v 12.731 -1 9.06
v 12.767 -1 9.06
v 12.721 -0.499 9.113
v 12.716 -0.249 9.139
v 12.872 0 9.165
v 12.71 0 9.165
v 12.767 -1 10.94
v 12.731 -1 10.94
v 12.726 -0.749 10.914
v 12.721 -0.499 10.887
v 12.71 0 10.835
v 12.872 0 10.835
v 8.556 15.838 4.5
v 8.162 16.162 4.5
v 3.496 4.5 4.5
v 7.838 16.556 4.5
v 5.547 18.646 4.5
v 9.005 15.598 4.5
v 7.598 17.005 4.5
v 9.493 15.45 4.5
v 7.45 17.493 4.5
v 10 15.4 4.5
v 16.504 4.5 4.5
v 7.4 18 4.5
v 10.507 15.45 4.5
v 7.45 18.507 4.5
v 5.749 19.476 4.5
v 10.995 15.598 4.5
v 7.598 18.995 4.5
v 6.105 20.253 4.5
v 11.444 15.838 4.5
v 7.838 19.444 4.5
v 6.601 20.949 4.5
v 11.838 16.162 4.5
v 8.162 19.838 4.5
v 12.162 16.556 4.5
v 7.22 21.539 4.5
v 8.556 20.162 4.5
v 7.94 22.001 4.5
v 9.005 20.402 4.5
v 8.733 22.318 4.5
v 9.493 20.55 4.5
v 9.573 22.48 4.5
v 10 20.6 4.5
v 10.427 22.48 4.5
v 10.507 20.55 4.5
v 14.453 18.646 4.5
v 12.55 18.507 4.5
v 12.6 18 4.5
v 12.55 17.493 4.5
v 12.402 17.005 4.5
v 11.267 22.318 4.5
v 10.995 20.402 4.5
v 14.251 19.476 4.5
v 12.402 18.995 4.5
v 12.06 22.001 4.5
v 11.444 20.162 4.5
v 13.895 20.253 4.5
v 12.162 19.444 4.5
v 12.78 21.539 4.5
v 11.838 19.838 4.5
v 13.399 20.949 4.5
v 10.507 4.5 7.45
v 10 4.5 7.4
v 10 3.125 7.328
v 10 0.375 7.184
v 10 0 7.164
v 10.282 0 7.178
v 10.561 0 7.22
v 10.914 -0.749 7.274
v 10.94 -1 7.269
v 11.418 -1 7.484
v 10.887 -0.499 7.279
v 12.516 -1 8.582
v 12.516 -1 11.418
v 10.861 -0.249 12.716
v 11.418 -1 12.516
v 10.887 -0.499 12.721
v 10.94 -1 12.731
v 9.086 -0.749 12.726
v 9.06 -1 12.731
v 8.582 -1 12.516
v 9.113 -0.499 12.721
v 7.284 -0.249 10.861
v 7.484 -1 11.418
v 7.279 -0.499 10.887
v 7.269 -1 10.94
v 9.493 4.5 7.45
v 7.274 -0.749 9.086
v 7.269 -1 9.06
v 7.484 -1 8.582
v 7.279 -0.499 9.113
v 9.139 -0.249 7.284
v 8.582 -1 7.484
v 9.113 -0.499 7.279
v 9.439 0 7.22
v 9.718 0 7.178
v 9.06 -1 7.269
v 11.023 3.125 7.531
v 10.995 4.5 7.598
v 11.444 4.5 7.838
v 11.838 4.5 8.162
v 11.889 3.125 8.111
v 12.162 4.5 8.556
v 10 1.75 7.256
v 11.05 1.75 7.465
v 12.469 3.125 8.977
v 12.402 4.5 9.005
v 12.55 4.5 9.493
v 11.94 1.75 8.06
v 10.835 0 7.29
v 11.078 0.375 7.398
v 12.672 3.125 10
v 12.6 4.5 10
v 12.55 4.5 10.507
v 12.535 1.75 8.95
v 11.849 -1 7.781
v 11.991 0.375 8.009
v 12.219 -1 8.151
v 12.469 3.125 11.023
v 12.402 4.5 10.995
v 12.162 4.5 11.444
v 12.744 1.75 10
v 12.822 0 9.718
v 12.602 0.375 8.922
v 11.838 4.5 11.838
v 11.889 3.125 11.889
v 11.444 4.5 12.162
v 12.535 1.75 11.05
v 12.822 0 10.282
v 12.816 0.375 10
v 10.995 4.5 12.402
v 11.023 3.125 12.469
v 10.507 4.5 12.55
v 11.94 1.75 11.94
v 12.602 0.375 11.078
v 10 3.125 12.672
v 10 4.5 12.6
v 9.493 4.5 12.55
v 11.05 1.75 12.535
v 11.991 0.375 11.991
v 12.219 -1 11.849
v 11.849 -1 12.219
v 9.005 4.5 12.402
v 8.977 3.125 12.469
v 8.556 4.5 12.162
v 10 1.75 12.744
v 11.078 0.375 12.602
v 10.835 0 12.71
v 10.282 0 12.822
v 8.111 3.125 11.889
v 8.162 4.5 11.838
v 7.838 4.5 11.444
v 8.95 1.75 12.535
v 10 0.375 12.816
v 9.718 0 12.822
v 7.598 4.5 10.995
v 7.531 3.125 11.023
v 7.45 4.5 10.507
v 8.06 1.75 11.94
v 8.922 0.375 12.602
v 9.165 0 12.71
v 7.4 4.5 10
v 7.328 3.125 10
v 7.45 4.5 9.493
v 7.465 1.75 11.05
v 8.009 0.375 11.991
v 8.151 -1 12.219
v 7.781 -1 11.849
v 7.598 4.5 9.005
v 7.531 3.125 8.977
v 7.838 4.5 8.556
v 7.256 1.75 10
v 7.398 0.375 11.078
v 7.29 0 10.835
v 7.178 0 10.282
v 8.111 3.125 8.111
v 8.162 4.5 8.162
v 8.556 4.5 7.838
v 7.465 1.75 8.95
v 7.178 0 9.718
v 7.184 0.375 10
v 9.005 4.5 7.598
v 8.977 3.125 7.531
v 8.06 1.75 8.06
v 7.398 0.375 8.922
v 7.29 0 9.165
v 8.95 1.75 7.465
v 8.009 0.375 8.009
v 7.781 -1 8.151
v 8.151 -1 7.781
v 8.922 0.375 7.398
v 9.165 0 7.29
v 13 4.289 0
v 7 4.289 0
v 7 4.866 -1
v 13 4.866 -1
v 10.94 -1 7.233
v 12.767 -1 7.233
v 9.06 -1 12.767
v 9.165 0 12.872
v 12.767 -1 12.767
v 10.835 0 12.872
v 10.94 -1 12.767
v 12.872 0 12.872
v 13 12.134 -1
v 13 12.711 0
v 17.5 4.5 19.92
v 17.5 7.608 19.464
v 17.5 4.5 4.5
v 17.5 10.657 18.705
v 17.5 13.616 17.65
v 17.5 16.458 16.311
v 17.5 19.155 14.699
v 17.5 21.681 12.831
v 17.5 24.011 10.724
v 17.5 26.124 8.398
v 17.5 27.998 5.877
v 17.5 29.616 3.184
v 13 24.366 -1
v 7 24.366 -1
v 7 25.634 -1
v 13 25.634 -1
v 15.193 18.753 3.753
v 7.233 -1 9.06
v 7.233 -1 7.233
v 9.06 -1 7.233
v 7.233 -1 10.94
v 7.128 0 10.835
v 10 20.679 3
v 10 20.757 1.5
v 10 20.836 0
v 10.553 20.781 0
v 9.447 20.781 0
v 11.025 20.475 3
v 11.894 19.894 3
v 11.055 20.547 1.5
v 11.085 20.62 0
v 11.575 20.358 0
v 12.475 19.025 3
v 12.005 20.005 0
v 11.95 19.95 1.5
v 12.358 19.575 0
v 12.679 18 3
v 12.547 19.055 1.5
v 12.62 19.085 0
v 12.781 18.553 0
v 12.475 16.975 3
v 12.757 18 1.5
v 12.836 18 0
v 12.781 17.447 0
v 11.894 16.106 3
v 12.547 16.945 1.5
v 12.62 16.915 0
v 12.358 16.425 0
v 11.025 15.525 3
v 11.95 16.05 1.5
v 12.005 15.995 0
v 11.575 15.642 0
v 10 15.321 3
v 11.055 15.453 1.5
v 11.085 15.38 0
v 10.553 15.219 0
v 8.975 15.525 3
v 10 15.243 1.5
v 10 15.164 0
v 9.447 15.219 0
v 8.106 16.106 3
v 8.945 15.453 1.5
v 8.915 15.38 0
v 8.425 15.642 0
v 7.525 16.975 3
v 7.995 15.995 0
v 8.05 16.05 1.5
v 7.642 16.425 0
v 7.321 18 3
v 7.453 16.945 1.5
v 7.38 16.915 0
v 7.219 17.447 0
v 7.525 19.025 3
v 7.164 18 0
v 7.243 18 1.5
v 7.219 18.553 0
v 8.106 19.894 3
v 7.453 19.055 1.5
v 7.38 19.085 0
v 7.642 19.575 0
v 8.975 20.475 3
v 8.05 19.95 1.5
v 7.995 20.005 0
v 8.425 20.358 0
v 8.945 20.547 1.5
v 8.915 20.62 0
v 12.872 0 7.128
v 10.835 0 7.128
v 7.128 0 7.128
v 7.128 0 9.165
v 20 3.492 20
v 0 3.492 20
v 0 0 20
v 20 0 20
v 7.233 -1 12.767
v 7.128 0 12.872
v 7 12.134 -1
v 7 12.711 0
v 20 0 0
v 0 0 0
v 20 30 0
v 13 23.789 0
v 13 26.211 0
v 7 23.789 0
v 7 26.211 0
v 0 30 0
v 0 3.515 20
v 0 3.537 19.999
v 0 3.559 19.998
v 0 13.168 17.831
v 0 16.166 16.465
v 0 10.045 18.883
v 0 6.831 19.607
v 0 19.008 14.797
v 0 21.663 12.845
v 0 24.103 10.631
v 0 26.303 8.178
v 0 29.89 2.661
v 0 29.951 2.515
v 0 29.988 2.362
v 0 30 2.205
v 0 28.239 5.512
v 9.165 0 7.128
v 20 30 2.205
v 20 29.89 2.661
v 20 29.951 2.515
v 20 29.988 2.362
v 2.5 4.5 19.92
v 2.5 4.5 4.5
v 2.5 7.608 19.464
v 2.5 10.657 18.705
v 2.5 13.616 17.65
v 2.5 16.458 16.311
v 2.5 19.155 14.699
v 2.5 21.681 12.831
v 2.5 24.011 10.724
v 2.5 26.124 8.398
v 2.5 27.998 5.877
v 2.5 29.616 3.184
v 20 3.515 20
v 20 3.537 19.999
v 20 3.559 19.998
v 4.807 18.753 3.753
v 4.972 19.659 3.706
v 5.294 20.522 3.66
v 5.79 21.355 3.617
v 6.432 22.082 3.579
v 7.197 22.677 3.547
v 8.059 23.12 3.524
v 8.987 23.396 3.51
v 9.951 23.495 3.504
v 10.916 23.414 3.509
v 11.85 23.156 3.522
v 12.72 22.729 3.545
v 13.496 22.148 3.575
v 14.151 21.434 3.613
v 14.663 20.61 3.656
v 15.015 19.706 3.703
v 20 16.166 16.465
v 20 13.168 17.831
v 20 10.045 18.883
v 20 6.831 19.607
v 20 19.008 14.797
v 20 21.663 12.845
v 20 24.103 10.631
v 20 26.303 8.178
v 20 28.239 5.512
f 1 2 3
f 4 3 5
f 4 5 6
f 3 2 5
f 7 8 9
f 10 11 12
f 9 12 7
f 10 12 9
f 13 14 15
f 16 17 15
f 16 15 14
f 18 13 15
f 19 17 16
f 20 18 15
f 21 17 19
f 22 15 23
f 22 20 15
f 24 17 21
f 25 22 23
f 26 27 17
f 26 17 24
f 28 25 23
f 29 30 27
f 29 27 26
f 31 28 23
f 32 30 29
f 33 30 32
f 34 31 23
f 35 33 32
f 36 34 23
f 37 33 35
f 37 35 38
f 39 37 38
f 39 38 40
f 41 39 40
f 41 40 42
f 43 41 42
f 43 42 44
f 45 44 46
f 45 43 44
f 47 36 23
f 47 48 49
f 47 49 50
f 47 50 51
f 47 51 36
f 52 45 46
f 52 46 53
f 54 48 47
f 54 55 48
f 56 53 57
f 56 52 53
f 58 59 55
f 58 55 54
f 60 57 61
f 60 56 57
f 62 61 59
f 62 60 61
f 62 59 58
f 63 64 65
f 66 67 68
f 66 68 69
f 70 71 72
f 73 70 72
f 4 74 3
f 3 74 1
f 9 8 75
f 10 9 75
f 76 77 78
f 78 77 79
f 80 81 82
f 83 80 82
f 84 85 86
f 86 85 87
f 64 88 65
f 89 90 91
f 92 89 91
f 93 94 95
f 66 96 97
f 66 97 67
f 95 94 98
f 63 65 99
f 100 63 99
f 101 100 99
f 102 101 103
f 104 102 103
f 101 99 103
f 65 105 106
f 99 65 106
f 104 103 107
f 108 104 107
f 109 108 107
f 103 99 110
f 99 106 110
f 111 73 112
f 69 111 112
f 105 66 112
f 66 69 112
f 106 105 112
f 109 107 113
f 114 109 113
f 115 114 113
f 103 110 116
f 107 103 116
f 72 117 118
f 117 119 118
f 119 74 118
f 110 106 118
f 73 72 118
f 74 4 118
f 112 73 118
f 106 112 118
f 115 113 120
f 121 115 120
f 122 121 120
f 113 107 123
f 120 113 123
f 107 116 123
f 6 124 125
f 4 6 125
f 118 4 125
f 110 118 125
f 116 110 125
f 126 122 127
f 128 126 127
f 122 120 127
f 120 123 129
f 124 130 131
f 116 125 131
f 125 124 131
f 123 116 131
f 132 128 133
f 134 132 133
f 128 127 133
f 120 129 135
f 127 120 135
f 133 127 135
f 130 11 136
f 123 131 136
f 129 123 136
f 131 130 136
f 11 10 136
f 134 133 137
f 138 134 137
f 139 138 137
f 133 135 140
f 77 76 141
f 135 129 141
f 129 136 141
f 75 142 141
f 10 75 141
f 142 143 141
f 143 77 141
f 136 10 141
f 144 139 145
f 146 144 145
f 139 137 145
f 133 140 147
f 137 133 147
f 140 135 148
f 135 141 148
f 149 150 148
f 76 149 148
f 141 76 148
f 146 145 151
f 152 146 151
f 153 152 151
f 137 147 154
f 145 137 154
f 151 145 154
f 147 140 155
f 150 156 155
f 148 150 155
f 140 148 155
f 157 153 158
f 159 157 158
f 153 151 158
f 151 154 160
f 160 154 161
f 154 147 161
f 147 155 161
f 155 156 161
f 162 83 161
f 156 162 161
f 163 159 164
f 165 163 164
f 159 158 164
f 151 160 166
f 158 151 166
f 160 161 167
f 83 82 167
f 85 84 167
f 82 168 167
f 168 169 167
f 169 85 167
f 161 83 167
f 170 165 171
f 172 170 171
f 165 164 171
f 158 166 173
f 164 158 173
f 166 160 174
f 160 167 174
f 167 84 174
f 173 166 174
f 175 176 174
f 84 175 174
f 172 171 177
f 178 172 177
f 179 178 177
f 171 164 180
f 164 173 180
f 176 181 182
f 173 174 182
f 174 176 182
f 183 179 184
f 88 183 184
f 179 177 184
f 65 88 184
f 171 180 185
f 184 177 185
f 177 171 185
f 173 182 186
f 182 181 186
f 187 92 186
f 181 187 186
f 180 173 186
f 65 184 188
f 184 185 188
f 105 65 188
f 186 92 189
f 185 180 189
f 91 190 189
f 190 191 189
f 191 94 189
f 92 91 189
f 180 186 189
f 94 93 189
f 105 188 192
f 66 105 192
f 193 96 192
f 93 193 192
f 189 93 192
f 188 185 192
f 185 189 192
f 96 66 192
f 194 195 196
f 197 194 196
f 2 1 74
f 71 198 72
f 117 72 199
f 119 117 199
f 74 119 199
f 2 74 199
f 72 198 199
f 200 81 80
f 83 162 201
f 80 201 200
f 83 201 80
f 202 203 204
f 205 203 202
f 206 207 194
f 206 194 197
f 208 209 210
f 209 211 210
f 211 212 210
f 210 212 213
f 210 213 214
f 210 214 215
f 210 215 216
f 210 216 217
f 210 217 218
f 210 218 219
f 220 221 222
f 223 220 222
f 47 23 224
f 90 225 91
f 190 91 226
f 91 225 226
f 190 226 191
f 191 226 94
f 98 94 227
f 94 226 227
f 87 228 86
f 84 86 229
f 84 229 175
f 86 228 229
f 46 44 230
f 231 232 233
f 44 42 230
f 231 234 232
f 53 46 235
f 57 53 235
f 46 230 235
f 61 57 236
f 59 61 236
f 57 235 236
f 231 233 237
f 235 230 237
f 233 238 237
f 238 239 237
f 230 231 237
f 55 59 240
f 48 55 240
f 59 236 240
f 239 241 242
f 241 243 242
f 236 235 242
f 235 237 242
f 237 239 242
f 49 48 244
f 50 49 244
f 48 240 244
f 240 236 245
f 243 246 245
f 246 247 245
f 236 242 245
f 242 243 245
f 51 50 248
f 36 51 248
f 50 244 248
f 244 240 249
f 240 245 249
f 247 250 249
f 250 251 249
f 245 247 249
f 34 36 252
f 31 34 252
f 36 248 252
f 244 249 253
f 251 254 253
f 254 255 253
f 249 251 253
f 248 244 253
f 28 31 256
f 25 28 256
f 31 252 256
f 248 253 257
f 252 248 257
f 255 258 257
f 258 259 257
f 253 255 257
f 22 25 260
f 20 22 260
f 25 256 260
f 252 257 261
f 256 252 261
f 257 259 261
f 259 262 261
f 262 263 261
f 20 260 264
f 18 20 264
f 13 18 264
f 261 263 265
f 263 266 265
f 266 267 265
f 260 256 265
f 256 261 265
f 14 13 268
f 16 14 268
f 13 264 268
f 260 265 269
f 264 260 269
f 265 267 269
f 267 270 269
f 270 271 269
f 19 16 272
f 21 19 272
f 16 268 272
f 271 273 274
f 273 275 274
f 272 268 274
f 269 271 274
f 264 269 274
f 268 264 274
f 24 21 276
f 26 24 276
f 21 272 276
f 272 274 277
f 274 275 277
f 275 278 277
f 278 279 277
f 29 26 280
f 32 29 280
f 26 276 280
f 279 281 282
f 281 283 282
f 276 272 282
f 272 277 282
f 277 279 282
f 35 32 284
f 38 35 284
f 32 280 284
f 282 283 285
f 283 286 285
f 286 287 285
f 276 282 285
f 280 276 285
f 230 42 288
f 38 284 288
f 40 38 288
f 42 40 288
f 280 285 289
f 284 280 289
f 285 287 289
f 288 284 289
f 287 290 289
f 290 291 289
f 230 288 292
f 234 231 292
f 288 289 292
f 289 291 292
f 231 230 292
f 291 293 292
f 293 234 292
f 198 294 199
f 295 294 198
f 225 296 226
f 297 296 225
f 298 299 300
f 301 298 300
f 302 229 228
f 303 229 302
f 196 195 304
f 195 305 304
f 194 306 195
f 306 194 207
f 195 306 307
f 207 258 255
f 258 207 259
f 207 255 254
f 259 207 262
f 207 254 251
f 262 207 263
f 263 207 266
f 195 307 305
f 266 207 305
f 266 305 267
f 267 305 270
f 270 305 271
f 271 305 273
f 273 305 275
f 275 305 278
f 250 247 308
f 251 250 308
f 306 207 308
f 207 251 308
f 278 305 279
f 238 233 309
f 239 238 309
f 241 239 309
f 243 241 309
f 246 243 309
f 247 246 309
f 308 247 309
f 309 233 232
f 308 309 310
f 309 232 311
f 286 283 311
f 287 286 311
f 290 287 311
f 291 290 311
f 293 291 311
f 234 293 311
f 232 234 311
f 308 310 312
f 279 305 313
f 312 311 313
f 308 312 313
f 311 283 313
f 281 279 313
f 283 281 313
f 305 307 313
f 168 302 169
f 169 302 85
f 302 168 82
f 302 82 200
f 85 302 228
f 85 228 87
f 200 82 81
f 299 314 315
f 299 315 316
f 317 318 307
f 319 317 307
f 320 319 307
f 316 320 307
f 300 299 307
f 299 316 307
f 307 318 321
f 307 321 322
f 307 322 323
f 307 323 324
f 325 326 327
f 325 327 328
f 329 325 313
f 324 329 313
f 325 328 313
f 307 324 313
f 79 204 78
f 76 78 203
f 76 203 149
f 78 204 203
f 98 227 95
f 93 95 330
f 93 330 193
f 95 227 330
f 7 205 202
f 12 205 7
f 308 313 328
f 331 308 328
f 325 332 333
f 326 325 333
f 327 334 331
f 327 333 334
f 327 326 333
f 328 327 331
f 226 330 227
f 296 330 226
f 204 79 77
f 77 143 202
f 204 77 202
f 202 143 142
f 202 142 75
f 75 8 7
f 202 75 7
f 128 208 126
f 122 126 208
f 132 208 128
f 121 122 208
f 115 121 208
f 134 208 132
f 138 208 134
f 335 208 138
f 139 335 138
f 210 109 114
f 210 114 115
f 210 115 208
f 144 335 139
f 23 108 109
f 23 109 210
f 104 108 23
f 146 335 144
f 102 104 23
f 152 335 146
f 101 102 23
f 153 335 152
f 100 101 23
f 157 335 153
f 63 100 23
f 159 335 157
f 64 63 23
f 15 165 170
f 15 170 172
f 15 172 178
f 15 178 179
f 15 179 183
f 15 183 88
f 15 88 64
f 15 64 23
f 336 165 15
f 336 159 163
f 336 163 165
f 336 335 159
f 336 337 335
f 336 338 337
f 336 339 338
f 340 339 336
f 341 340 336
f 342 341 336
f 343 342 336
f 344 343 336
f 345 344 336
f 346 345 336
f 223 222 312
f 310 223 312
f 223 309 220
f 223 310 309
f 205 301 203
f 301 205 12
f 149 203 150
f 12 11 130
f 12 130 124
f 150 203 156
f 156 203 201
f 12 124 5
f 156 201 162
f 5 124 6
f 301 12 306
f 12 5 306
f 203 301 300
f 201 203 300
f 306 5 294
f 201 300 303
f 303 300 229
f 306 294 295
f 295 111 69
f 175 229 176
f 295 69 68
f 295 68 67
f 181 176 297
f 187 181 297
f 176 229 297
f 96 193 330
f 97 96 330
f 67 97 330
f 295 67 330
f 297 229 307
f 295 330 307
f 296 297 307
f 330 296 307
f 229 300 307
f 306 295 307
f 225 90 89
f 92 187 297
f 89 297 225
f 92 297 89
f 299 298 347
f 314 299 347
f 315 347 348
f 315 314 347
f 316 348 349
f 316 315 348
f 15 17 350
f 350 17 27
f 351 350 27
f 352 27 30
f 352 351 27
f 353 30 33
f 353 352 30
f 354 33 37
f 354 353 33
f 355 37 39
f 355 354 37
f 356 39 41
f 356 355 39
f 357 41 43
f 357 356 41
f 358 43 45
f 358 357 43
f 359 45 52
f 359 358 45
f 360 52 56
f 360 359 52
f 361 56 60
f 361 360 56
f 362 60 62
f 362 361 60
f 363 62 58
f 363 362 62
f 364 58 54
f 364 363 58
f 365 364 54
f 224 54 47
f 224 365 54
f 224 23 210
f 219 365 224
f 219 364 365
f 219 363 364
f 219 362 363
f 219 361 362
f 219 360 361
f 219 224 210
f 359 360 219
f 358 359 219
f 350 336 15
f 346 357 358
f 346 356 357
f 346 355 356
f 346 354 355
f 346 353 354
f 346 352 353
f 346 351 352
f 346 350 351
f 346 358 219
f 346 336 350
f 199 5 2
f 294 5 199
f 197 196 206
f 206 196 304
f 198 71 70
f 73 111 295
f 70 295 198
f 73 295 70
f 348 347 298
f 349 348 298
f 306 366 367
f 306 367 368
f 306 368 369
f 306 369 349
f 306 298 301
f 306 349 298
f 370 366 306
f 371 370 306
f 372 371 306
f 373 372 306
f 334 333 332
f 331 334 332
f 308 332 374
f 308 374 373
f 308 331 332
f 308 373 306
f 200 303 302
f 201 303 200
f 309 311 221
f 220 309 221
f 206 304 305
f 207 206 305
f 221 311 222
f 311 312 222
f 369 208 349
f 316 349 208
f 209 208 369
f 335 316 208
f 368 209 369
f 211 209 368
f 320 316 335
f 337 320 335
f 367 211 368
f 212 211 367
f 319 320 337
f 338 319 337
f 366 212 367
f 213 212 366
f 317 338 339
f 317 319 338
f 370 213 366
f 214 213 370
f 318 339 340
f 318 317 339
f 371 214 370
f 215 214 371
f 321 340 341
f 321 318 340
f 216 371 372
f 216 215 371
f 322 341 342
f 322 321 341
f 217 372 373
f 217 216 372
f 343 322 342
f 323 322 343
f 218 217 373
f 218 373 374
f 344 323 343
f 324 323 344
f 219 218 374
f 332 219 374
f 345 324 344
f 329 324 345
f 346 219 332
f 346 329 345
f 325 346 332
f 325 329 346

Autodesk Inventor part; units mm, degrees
sketch "Sketch_1" plane through (0, 0, 0) normal (1, 0, 0) x (0, 0, -1)
  line L0 (-20, 3.4921) -> (-20, 0)
  line L1 (-20, 0) -> (0, 0)
  line L2 (0, 0) -> (0, 30)
  line L3 (0, 30) -> (-2.2048, 30)
  arc A0 (-2.2048, 30) -> (-2.6607, 29.89) centre (-2.2048, 29) ccw
  arc A1 (-2.6607, 29.89) -> (-19.9977, 3.5593) centre (11.93, 1.41) ccw
  arc A2 (-19.9977, 3.5593) -> (-20, 3.4921) centre (-19, 3.4921) ccw
extrude "Extrusion1" add sketch "Sketch_1" along normal blind 20
sketch "Sketch_2" plane through (10, 0, 0) normal (1, 0, 0) x (0, 0, -1)
  line L0 (-20, 30) -> (-20, 4.5)
  line L1 (-20, 4.5) -> (-4.5, 4.5)
  line L2 (-4.5, 4.5) -> (-3.1636, 30)
  line L3 (-3.1636, 30) -> (-20, 30)
extrude "Extrusion2" cut sketch "Sketch_2" along normal mid plane 15
sketch "Sketch_5" plane through (10, 0, 0) normal (1, 0, 0) x (0, 0, -1)
  line L0 (-0.5, 26.5) -> (-0.5, 23.5)
  line L1 (-0.5, 23.5) -> (1, 24.366)
  line L2 (1, 24.366) -> (1, 25.634)
  line L3 (1, 25.634) -> (-0.5, 26.5)
extrude "Extrusion3" add sketch "Sketch_5" along normal mid plane 6
sketch "Sketch_6" plane through (10, 0, 0) normal (1, 0, 0) x (0, 0, -1)
  line L0 (-0.5, 13) -> (-0.5, 4)
  line L1 (-0.5, 4) -> (1, 4.866)
  line L2 (1, 4.866) -> (1, 12.134)
  line L3 (1, 12.134) -> (-0.5, 13)
extrude "Extrusion4" add sketch "Sketch_6" along normal mid plane 6
sketch "Sketch_3" plane through (0, 0, 4.5) normal (0, 0, 1) x (1, 0, 0)
  line L0 (3.4955, 4.5) -> (16.5045, 4.5)
  line L1 (16.5045, 4.5) -> (14.4534, 18.6457)
  arc A0 (14.4534, 18.6457) -> (5.5466, 18.6457) centre (10, 18) ccw
  line L2 (5.5466, 18.6457) -> (3.4955, 4.5)
extrude "Extrusion5" add sketch "Sketch_3" against normal blind 2 draft 45
sketch "Sketch_7" plane through (0, 0.5, 0) normal (0, 1, 0) x (1, 0, 0)
  line L0 (7.075, -12.925) -> (12.925, -12.925)
  line L1 (12.925, -12.925) -> (12.925, -7.075)
  line L2 (12.925, -7.075) -> (7.075, -7.075)
  line L3 (7.075, -7.075) -> (7.075, -12.925)
extrude "Extrusion6" add sketch "Sketch_7" against normal blind 1.5 draft -6
sketch "Sketch_9" plane through (0, 0, 0) normal (0, 1, 0) x (1, 0, 0)
  line L0 (7.075, -10.835) -> (9.165, -10.835)
  line L1 (9.165, -10.835) -> (9.165, -12.925)
  line L2 (9.165, -12.925) -> (10.835, -12.925)
  line L3 (10.835, -12.925) -> (10.835, -10.835)
  line L4 (10.835, -10.835) -> (12.925, -10.835)
  line L5 (12.925, -10.835) -> (12.925, -9.165)
  line L6 (12.925, -9.165) -> (10.835, -9.165)
  line L7 (10.835, -9.165) -> (10.835, -7.075)
  line L8 (10.835, -7.075) -> (9.165, -7.075)
  line L9 (9.165, -7.075) -> (9.165, -9.165)
  line L10 (9.165, -9.165) -> (7.075, -9.165)
  line L11 (7.075, -9.165) -> (7.075, -10.835)
extrude "Extrusion7" cut sketch "Sketch_9" against normal blind 1 draft 6
sketch "Sketch_4" plane through (10, 0, 0) normal (1, 0, 0) x (0, 0, -1)
  line L0 (0, 18) -> (-4.5, 18)
  line L1 (-4.5, 18) -> (-4.5, 20.6)
  line L2 (-4.5, 20.6) -> (0, 20.8358)
  line L3 (0, 20.8358) -> (0, 18)
  line L4 (0, 18) -> (-4.5, 18)
revolve "Revolution1" cut sketch "Sketch_4" angle 360 about axis through (10, 18, 0) along (0, 0, -1)
sketch "Sketch_8" plane through (10, 0, 0) normal (1, 0, 0) x (0, 0, -1)
  line L0 (-10, -1) -> (-10, 4.5)
  line L1 (-10, 4.5) -> (-7.4, 4.5)
  line L2 (-7.4, 4.5) -> (-7.1118, -1)
  line L3 (-7.1118, -1) -> (-10, -1)
  line L4 (-10, -1) -> (-10, 4.5)
revolve "Revolution2" cut sketch "Sketch_8" angle 360 about axis through (10, -1, 10) along (0, -1, 0)
ref_plane "to_bolt1_XY" through (10, 18, 4.5) normal (0, 0, 1) x (1, 0, 0)
ref_plane "to_bolt1_YZ" through (10, 18, 4.5) normal (1, 0, 0) x (0, 1, 0)
ref_plane "to_bolt1_ZX" through (10, 18, 4.5) normal (0, 1, 0) x (0, 0, 1)
ref_plane "to_bolt2_XY" through (10, 4.5, 10) normal (0, 1, 0) x (1, 0, 0)
ref_plane "to_bolt2_YZ" through (10, 4.5, 10) normal (1, 0, 0) x (0, 0, -1)
ref_plane "to_bolt2_ZX" through (10, 4.5, 10) normal (0, 0, -1) x (0, 1, 0)
ref_plane "to_nut1_XY" through (10, 18, -1) normal (0, 0, -1) x (0, 1, 0)
ref_plane "to_nut1_YZ" through (10, 18, -1) normal (0, 1, 0) x (1, 0, 0)
ref_plane "to_nut1_ZX" through (10, 18, -1) normal (1, 0, 0) x (0, 0, -1)
ref_plane "to_nut2_XY" through (10, -1, 10) normal (0, -1, 0) x (0, 0, -1)
ref_plane "to_nut2_YZ" through (10, -1, 10) normal (0, 0, -1) x (1, 0, 0)
ref_plane "to_nut2_ZX" through (10, -1, 10) normal (1, 0, 0) x (0, -1, 0)
properties part number "HBLFSNF5-SSU_b"
